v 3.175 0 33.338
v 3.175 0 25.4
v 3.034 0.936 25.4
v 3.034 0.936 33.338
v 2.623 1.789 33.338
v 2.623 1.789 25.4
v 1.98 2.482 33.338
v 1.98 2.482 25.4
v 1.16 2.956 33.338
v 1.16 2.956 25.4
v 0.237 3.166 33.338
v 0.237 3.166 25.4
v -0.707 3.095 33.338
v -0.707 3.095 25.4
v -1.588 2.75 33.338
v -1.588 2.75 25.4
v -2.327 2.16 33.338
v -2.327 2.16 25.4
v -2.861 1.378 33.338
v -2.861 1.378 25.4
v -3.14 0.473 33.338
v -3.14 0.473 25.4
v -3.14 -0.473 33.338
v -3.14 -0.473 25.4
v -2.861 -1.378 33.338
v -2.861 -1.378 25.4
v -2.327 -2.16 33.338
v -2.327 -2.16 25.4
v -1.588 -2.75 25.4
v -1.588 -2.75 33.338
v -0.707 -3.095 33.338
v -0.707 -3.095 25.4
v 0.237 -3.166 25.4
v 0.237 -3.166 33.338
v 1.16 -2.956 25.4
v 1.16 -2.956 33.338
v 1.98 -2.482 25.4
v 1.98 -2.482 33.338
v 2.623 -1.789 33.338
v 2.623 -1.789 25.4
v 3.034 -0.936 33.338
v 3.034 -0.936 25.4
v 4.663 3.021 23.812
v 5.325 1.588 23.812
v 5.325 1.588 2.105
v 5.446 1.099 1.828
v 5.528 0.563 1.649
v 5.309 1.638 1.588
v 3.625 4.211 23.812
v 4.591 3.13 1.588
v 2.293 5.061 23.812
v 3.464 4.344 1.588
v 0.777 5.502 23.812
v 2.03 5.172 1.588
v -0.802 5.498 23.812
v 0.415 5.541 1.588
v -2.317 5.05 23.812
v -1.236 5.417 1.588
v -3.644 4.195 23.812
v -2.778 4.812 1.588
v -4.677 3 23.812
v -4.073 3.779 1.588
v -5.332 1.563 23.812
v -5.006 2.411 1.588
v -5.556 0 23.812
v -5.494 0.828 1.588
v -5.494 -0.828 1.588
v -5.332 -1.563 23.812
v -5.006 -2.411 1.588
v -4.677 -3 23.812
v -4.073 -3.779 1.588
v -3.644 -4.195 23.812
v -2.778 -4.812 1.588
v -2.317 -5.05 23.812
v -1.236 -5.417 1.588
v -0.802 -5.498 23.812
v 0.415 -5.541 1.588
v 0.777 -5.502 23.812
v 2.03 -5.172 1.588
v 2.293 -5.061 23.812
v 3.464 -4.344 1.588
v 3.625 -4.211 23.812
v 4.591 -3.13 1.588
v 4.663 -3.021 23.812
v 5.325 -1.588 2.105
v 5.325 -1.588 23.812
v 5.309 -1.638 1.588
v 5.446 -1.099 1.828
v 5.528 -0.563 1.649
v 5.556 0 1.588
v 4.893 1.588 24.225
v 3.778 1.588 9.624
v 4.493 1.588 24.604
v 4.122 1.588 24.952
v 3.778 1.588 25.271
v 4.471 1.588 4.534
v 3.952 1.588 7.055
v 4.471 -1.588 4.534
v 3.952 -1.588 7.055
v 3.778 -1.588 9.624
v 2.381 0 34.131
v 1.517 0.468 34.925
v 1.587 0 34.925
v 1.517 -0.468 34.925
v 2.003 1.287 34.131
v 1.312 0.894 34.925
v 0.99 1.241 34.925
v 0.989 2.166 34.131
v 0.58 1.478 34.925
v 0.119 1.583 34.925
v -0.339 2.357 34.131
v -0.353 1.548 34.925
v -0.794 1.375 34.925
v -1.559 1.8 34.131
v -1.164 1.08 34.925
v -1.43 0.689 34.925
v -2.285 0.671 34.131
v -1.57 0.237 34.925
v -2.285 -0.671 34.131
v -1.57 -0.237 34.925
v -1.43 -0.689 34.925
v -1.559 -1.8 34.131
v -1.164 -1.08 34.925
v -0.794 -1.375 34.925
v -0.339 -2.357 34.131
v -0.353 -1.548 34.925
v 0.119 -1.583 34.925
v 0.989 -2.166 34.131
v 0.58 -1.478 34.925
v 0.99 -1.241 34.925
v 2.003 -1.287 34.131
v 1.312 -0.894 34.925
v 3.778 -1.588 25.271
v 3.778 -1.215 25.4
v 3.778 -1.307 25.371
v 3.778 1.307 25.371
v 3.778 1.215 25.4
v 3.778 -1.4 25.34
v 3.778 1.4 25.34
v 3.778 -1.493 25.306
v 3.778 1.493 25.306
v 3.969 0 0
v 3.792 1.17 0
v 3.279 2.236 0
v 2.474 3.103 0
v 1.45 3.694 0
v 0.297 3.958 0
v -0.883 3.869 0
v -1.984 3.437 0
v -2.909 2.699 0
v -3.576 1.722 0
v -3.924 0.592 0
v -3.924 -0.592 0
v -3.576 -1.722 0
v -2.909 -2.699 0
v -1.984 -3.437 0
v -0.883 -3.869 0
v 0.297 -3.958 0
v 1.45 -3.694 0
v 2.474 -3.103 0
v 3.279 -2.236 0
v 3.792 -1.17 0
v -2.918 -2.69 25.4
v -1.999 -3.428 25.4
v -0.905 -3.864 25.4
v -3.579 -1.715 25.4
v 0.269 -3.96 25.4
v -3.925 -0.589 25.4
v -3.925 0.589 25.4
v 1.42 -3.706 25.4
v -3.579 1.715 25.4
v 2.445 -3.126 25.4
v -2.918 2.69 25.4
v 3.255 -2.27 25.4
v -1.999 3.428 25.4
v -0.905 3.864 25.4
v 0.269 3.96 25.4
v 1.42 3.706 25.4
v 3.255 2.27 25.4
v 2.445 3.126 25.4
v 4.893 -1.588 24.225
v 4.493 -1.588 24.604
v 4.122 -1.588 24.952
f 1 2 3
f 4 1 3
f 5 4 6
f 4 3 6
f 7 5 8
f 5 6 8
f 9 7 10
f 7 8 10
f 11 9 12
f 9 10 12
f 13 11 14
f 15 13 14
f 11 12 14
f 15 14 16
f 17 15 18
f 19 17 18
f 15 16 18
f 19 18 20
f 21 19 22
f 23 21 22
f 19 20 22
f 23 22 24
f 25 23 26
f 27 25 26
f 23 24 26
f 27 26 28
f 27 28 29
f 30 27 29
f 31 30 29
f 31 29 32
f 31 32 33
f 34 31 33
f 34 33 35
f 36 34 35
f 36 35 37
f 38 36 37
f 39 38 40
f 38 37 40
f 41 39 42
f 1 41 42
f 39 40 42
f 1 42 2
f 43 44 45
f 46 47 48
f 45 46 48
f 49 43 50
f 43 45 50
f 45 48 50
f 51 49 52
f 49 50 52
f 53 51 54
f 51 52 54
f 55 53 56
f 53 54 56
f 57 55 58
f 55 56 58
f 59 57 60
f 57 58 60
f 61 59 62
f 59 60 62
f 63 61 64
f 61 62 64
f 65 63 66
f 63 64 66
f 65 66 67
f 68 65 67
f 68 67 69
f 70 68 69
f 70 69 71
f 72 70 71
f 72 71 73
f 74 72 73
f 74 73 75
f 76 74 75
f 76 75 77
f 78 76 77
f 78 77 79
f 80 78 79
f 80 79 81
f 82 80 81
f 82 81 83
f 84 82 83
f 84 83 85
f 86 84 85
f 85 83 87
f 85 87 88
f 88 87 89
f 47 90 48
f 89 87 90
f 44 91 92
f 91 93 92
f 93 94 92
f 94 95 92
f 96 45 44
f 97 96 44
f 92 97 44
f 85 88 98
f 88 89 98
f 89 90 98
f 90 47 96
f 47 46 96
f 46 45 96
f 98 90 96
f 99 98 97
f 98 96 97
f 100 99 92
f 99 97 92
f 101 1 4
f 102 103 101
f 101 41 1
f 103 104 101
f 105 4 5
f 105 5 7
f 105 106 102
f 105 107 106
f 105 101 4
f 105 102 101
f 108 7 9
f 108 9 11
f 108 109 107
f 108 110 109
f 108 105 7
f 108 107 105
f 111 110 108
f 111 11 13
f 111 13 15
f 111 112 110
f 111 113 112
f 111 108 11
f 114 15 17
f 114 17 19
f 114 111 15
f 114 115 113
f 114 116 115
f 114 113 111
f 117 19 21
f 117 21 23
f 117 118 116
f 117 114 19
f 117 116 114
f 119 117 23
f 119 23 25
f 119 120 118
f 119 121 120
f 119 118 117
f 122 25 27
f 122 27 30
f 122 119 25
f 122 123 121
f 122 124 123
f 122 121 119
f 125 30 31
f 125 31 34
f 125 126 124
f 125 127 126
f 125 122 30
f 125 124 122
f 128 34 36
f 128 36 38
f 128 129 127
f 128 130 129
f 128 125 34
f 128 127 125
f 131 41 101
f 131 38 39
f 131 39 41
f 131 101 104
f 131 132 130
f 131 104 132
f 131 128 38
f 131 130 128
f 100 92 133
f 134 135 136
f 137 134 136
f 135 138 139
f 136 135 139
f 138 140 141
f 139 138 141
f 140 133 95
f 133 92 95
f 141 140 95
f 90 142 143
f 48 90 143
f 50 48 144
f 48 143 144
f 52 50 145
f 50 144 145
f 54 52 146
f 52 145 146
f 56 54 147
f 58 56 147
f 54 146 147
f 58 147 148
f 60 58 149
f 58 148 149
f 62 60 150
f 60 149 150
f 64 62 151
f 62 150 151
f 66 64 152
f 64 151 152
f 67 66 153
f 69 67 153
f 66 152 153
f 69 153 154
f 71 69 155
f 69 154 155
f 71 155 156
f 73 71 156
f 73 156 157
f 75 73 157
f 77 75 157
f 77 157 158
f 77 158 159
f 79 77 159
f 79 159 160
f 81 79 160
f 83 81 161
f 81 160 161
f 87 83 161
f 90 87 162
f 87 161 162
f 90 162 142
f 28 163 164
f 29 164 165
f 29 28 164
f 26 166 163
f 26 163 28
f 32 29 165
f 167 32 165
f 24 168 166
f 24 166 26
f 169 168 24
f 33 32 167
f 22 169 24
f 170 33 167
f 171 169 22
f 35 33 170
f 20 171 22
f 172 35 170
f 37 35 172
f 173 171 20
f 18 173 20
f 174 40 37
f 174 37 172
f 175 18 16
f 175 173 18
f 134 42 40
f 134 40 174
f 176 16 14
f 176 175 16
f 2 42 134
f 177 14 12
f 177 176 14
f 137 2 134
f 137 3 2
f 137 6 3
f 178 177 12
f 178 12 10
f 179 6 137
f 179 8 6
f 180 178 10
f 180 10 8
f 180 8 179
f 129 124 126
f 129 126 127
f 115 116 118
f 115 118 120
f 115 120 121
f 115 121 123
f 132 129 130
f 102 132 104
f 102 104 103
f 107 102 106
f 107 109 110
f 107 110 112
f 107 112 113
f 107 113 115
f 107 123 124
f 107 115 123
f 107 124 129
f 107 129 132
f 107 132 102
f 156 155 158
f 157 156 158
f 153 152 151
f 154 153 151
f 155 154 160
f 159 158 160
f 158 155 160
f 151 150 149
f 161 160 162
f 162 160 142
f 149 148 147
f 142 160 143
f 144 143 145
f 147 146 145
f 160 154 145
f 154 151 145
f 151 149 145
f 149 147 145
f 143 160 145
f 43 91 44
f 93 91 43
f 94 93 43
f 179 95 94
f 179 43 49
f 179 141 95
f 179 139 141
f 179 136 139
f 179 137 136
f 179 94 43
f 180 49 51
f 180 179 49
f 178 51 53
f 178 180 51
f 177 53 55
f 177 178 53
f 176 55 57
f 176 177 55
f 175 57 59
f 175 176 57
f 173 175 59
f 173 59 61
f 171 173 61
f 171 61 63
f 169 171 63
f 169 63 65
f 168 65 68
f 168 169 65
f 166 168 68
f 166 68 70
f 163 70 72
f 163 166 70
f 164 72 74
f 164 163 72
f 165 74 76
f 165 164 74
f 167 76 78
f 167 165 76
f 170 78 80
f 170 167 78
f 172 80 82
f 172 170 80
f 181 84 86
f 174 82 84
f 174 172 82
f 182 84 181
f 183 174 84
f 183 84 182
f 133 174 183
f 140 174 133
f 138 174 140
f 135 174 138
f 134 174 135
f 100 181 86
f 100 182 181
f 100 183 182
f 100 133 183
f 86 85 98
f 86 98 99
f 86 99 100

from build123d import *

# Parameters (mm, degrees)
SKETCH1_R          = 5.55625
EXTRUDE1_DEPTH     = 25.4
SKETCH2_R          = 3.175
EXTRUDE2_DEPTH     = 9.525
CHAMFER1_SIZE      = 1.5875
CUT_EXTRUDE1_DEPTH = 1.5875


with BuildPart() as part:
    # Sketch1 → Extrude1 (new body)
    with BuildSketch(Plane.XY):
        Circle(SKETCH1_R)
    extrude(amount=EXTRUDE1_DEPTH)

    # Sketch2 → Extrude2 (add)
    with BuildSketch(Plane.XY.offset(25.4)):
        Circle(SKETCH2_R)
    extrude(amount=EXTRUDE2_DEPTH)

    # Chamfer1
    chamfer1_edges = [part.edges().sort_by_distance(p)[0] for p in [
        (-5.55625, 0, 0),
        (-5.55625, 0, 25.4),
        (-3.175, 0, 34.925),
    ]]
    chamfer(chamfer1_edges, length=CHAMFER1_SIZE)

    # Sketch3 → Cut-Extrude1 (cut, symmetric)
    with BuildSketch(Plane(origin=(0, 0, 0), x_dir=(1, 0, 0), z_dir=(0, 1, 0))):
        with BuildLine():
            Line((3.77825, -9.623700346), (3.77825, -25.4))
            Line((3.77825, -25.4), (5.55625, -25.4))
            Line((5.55625, -25.4), (5.55625, -1.5875))
            ThreePointArc((5.55625, -1.5875), (4.228060485, -5.508430002), (3.77825, -9.623700346))
        make_face()
    extrude(amount=CUT_EXTRUDE1_DEPTH, both=True, mode=Mode.SUBTRACT)


solid = part.part
